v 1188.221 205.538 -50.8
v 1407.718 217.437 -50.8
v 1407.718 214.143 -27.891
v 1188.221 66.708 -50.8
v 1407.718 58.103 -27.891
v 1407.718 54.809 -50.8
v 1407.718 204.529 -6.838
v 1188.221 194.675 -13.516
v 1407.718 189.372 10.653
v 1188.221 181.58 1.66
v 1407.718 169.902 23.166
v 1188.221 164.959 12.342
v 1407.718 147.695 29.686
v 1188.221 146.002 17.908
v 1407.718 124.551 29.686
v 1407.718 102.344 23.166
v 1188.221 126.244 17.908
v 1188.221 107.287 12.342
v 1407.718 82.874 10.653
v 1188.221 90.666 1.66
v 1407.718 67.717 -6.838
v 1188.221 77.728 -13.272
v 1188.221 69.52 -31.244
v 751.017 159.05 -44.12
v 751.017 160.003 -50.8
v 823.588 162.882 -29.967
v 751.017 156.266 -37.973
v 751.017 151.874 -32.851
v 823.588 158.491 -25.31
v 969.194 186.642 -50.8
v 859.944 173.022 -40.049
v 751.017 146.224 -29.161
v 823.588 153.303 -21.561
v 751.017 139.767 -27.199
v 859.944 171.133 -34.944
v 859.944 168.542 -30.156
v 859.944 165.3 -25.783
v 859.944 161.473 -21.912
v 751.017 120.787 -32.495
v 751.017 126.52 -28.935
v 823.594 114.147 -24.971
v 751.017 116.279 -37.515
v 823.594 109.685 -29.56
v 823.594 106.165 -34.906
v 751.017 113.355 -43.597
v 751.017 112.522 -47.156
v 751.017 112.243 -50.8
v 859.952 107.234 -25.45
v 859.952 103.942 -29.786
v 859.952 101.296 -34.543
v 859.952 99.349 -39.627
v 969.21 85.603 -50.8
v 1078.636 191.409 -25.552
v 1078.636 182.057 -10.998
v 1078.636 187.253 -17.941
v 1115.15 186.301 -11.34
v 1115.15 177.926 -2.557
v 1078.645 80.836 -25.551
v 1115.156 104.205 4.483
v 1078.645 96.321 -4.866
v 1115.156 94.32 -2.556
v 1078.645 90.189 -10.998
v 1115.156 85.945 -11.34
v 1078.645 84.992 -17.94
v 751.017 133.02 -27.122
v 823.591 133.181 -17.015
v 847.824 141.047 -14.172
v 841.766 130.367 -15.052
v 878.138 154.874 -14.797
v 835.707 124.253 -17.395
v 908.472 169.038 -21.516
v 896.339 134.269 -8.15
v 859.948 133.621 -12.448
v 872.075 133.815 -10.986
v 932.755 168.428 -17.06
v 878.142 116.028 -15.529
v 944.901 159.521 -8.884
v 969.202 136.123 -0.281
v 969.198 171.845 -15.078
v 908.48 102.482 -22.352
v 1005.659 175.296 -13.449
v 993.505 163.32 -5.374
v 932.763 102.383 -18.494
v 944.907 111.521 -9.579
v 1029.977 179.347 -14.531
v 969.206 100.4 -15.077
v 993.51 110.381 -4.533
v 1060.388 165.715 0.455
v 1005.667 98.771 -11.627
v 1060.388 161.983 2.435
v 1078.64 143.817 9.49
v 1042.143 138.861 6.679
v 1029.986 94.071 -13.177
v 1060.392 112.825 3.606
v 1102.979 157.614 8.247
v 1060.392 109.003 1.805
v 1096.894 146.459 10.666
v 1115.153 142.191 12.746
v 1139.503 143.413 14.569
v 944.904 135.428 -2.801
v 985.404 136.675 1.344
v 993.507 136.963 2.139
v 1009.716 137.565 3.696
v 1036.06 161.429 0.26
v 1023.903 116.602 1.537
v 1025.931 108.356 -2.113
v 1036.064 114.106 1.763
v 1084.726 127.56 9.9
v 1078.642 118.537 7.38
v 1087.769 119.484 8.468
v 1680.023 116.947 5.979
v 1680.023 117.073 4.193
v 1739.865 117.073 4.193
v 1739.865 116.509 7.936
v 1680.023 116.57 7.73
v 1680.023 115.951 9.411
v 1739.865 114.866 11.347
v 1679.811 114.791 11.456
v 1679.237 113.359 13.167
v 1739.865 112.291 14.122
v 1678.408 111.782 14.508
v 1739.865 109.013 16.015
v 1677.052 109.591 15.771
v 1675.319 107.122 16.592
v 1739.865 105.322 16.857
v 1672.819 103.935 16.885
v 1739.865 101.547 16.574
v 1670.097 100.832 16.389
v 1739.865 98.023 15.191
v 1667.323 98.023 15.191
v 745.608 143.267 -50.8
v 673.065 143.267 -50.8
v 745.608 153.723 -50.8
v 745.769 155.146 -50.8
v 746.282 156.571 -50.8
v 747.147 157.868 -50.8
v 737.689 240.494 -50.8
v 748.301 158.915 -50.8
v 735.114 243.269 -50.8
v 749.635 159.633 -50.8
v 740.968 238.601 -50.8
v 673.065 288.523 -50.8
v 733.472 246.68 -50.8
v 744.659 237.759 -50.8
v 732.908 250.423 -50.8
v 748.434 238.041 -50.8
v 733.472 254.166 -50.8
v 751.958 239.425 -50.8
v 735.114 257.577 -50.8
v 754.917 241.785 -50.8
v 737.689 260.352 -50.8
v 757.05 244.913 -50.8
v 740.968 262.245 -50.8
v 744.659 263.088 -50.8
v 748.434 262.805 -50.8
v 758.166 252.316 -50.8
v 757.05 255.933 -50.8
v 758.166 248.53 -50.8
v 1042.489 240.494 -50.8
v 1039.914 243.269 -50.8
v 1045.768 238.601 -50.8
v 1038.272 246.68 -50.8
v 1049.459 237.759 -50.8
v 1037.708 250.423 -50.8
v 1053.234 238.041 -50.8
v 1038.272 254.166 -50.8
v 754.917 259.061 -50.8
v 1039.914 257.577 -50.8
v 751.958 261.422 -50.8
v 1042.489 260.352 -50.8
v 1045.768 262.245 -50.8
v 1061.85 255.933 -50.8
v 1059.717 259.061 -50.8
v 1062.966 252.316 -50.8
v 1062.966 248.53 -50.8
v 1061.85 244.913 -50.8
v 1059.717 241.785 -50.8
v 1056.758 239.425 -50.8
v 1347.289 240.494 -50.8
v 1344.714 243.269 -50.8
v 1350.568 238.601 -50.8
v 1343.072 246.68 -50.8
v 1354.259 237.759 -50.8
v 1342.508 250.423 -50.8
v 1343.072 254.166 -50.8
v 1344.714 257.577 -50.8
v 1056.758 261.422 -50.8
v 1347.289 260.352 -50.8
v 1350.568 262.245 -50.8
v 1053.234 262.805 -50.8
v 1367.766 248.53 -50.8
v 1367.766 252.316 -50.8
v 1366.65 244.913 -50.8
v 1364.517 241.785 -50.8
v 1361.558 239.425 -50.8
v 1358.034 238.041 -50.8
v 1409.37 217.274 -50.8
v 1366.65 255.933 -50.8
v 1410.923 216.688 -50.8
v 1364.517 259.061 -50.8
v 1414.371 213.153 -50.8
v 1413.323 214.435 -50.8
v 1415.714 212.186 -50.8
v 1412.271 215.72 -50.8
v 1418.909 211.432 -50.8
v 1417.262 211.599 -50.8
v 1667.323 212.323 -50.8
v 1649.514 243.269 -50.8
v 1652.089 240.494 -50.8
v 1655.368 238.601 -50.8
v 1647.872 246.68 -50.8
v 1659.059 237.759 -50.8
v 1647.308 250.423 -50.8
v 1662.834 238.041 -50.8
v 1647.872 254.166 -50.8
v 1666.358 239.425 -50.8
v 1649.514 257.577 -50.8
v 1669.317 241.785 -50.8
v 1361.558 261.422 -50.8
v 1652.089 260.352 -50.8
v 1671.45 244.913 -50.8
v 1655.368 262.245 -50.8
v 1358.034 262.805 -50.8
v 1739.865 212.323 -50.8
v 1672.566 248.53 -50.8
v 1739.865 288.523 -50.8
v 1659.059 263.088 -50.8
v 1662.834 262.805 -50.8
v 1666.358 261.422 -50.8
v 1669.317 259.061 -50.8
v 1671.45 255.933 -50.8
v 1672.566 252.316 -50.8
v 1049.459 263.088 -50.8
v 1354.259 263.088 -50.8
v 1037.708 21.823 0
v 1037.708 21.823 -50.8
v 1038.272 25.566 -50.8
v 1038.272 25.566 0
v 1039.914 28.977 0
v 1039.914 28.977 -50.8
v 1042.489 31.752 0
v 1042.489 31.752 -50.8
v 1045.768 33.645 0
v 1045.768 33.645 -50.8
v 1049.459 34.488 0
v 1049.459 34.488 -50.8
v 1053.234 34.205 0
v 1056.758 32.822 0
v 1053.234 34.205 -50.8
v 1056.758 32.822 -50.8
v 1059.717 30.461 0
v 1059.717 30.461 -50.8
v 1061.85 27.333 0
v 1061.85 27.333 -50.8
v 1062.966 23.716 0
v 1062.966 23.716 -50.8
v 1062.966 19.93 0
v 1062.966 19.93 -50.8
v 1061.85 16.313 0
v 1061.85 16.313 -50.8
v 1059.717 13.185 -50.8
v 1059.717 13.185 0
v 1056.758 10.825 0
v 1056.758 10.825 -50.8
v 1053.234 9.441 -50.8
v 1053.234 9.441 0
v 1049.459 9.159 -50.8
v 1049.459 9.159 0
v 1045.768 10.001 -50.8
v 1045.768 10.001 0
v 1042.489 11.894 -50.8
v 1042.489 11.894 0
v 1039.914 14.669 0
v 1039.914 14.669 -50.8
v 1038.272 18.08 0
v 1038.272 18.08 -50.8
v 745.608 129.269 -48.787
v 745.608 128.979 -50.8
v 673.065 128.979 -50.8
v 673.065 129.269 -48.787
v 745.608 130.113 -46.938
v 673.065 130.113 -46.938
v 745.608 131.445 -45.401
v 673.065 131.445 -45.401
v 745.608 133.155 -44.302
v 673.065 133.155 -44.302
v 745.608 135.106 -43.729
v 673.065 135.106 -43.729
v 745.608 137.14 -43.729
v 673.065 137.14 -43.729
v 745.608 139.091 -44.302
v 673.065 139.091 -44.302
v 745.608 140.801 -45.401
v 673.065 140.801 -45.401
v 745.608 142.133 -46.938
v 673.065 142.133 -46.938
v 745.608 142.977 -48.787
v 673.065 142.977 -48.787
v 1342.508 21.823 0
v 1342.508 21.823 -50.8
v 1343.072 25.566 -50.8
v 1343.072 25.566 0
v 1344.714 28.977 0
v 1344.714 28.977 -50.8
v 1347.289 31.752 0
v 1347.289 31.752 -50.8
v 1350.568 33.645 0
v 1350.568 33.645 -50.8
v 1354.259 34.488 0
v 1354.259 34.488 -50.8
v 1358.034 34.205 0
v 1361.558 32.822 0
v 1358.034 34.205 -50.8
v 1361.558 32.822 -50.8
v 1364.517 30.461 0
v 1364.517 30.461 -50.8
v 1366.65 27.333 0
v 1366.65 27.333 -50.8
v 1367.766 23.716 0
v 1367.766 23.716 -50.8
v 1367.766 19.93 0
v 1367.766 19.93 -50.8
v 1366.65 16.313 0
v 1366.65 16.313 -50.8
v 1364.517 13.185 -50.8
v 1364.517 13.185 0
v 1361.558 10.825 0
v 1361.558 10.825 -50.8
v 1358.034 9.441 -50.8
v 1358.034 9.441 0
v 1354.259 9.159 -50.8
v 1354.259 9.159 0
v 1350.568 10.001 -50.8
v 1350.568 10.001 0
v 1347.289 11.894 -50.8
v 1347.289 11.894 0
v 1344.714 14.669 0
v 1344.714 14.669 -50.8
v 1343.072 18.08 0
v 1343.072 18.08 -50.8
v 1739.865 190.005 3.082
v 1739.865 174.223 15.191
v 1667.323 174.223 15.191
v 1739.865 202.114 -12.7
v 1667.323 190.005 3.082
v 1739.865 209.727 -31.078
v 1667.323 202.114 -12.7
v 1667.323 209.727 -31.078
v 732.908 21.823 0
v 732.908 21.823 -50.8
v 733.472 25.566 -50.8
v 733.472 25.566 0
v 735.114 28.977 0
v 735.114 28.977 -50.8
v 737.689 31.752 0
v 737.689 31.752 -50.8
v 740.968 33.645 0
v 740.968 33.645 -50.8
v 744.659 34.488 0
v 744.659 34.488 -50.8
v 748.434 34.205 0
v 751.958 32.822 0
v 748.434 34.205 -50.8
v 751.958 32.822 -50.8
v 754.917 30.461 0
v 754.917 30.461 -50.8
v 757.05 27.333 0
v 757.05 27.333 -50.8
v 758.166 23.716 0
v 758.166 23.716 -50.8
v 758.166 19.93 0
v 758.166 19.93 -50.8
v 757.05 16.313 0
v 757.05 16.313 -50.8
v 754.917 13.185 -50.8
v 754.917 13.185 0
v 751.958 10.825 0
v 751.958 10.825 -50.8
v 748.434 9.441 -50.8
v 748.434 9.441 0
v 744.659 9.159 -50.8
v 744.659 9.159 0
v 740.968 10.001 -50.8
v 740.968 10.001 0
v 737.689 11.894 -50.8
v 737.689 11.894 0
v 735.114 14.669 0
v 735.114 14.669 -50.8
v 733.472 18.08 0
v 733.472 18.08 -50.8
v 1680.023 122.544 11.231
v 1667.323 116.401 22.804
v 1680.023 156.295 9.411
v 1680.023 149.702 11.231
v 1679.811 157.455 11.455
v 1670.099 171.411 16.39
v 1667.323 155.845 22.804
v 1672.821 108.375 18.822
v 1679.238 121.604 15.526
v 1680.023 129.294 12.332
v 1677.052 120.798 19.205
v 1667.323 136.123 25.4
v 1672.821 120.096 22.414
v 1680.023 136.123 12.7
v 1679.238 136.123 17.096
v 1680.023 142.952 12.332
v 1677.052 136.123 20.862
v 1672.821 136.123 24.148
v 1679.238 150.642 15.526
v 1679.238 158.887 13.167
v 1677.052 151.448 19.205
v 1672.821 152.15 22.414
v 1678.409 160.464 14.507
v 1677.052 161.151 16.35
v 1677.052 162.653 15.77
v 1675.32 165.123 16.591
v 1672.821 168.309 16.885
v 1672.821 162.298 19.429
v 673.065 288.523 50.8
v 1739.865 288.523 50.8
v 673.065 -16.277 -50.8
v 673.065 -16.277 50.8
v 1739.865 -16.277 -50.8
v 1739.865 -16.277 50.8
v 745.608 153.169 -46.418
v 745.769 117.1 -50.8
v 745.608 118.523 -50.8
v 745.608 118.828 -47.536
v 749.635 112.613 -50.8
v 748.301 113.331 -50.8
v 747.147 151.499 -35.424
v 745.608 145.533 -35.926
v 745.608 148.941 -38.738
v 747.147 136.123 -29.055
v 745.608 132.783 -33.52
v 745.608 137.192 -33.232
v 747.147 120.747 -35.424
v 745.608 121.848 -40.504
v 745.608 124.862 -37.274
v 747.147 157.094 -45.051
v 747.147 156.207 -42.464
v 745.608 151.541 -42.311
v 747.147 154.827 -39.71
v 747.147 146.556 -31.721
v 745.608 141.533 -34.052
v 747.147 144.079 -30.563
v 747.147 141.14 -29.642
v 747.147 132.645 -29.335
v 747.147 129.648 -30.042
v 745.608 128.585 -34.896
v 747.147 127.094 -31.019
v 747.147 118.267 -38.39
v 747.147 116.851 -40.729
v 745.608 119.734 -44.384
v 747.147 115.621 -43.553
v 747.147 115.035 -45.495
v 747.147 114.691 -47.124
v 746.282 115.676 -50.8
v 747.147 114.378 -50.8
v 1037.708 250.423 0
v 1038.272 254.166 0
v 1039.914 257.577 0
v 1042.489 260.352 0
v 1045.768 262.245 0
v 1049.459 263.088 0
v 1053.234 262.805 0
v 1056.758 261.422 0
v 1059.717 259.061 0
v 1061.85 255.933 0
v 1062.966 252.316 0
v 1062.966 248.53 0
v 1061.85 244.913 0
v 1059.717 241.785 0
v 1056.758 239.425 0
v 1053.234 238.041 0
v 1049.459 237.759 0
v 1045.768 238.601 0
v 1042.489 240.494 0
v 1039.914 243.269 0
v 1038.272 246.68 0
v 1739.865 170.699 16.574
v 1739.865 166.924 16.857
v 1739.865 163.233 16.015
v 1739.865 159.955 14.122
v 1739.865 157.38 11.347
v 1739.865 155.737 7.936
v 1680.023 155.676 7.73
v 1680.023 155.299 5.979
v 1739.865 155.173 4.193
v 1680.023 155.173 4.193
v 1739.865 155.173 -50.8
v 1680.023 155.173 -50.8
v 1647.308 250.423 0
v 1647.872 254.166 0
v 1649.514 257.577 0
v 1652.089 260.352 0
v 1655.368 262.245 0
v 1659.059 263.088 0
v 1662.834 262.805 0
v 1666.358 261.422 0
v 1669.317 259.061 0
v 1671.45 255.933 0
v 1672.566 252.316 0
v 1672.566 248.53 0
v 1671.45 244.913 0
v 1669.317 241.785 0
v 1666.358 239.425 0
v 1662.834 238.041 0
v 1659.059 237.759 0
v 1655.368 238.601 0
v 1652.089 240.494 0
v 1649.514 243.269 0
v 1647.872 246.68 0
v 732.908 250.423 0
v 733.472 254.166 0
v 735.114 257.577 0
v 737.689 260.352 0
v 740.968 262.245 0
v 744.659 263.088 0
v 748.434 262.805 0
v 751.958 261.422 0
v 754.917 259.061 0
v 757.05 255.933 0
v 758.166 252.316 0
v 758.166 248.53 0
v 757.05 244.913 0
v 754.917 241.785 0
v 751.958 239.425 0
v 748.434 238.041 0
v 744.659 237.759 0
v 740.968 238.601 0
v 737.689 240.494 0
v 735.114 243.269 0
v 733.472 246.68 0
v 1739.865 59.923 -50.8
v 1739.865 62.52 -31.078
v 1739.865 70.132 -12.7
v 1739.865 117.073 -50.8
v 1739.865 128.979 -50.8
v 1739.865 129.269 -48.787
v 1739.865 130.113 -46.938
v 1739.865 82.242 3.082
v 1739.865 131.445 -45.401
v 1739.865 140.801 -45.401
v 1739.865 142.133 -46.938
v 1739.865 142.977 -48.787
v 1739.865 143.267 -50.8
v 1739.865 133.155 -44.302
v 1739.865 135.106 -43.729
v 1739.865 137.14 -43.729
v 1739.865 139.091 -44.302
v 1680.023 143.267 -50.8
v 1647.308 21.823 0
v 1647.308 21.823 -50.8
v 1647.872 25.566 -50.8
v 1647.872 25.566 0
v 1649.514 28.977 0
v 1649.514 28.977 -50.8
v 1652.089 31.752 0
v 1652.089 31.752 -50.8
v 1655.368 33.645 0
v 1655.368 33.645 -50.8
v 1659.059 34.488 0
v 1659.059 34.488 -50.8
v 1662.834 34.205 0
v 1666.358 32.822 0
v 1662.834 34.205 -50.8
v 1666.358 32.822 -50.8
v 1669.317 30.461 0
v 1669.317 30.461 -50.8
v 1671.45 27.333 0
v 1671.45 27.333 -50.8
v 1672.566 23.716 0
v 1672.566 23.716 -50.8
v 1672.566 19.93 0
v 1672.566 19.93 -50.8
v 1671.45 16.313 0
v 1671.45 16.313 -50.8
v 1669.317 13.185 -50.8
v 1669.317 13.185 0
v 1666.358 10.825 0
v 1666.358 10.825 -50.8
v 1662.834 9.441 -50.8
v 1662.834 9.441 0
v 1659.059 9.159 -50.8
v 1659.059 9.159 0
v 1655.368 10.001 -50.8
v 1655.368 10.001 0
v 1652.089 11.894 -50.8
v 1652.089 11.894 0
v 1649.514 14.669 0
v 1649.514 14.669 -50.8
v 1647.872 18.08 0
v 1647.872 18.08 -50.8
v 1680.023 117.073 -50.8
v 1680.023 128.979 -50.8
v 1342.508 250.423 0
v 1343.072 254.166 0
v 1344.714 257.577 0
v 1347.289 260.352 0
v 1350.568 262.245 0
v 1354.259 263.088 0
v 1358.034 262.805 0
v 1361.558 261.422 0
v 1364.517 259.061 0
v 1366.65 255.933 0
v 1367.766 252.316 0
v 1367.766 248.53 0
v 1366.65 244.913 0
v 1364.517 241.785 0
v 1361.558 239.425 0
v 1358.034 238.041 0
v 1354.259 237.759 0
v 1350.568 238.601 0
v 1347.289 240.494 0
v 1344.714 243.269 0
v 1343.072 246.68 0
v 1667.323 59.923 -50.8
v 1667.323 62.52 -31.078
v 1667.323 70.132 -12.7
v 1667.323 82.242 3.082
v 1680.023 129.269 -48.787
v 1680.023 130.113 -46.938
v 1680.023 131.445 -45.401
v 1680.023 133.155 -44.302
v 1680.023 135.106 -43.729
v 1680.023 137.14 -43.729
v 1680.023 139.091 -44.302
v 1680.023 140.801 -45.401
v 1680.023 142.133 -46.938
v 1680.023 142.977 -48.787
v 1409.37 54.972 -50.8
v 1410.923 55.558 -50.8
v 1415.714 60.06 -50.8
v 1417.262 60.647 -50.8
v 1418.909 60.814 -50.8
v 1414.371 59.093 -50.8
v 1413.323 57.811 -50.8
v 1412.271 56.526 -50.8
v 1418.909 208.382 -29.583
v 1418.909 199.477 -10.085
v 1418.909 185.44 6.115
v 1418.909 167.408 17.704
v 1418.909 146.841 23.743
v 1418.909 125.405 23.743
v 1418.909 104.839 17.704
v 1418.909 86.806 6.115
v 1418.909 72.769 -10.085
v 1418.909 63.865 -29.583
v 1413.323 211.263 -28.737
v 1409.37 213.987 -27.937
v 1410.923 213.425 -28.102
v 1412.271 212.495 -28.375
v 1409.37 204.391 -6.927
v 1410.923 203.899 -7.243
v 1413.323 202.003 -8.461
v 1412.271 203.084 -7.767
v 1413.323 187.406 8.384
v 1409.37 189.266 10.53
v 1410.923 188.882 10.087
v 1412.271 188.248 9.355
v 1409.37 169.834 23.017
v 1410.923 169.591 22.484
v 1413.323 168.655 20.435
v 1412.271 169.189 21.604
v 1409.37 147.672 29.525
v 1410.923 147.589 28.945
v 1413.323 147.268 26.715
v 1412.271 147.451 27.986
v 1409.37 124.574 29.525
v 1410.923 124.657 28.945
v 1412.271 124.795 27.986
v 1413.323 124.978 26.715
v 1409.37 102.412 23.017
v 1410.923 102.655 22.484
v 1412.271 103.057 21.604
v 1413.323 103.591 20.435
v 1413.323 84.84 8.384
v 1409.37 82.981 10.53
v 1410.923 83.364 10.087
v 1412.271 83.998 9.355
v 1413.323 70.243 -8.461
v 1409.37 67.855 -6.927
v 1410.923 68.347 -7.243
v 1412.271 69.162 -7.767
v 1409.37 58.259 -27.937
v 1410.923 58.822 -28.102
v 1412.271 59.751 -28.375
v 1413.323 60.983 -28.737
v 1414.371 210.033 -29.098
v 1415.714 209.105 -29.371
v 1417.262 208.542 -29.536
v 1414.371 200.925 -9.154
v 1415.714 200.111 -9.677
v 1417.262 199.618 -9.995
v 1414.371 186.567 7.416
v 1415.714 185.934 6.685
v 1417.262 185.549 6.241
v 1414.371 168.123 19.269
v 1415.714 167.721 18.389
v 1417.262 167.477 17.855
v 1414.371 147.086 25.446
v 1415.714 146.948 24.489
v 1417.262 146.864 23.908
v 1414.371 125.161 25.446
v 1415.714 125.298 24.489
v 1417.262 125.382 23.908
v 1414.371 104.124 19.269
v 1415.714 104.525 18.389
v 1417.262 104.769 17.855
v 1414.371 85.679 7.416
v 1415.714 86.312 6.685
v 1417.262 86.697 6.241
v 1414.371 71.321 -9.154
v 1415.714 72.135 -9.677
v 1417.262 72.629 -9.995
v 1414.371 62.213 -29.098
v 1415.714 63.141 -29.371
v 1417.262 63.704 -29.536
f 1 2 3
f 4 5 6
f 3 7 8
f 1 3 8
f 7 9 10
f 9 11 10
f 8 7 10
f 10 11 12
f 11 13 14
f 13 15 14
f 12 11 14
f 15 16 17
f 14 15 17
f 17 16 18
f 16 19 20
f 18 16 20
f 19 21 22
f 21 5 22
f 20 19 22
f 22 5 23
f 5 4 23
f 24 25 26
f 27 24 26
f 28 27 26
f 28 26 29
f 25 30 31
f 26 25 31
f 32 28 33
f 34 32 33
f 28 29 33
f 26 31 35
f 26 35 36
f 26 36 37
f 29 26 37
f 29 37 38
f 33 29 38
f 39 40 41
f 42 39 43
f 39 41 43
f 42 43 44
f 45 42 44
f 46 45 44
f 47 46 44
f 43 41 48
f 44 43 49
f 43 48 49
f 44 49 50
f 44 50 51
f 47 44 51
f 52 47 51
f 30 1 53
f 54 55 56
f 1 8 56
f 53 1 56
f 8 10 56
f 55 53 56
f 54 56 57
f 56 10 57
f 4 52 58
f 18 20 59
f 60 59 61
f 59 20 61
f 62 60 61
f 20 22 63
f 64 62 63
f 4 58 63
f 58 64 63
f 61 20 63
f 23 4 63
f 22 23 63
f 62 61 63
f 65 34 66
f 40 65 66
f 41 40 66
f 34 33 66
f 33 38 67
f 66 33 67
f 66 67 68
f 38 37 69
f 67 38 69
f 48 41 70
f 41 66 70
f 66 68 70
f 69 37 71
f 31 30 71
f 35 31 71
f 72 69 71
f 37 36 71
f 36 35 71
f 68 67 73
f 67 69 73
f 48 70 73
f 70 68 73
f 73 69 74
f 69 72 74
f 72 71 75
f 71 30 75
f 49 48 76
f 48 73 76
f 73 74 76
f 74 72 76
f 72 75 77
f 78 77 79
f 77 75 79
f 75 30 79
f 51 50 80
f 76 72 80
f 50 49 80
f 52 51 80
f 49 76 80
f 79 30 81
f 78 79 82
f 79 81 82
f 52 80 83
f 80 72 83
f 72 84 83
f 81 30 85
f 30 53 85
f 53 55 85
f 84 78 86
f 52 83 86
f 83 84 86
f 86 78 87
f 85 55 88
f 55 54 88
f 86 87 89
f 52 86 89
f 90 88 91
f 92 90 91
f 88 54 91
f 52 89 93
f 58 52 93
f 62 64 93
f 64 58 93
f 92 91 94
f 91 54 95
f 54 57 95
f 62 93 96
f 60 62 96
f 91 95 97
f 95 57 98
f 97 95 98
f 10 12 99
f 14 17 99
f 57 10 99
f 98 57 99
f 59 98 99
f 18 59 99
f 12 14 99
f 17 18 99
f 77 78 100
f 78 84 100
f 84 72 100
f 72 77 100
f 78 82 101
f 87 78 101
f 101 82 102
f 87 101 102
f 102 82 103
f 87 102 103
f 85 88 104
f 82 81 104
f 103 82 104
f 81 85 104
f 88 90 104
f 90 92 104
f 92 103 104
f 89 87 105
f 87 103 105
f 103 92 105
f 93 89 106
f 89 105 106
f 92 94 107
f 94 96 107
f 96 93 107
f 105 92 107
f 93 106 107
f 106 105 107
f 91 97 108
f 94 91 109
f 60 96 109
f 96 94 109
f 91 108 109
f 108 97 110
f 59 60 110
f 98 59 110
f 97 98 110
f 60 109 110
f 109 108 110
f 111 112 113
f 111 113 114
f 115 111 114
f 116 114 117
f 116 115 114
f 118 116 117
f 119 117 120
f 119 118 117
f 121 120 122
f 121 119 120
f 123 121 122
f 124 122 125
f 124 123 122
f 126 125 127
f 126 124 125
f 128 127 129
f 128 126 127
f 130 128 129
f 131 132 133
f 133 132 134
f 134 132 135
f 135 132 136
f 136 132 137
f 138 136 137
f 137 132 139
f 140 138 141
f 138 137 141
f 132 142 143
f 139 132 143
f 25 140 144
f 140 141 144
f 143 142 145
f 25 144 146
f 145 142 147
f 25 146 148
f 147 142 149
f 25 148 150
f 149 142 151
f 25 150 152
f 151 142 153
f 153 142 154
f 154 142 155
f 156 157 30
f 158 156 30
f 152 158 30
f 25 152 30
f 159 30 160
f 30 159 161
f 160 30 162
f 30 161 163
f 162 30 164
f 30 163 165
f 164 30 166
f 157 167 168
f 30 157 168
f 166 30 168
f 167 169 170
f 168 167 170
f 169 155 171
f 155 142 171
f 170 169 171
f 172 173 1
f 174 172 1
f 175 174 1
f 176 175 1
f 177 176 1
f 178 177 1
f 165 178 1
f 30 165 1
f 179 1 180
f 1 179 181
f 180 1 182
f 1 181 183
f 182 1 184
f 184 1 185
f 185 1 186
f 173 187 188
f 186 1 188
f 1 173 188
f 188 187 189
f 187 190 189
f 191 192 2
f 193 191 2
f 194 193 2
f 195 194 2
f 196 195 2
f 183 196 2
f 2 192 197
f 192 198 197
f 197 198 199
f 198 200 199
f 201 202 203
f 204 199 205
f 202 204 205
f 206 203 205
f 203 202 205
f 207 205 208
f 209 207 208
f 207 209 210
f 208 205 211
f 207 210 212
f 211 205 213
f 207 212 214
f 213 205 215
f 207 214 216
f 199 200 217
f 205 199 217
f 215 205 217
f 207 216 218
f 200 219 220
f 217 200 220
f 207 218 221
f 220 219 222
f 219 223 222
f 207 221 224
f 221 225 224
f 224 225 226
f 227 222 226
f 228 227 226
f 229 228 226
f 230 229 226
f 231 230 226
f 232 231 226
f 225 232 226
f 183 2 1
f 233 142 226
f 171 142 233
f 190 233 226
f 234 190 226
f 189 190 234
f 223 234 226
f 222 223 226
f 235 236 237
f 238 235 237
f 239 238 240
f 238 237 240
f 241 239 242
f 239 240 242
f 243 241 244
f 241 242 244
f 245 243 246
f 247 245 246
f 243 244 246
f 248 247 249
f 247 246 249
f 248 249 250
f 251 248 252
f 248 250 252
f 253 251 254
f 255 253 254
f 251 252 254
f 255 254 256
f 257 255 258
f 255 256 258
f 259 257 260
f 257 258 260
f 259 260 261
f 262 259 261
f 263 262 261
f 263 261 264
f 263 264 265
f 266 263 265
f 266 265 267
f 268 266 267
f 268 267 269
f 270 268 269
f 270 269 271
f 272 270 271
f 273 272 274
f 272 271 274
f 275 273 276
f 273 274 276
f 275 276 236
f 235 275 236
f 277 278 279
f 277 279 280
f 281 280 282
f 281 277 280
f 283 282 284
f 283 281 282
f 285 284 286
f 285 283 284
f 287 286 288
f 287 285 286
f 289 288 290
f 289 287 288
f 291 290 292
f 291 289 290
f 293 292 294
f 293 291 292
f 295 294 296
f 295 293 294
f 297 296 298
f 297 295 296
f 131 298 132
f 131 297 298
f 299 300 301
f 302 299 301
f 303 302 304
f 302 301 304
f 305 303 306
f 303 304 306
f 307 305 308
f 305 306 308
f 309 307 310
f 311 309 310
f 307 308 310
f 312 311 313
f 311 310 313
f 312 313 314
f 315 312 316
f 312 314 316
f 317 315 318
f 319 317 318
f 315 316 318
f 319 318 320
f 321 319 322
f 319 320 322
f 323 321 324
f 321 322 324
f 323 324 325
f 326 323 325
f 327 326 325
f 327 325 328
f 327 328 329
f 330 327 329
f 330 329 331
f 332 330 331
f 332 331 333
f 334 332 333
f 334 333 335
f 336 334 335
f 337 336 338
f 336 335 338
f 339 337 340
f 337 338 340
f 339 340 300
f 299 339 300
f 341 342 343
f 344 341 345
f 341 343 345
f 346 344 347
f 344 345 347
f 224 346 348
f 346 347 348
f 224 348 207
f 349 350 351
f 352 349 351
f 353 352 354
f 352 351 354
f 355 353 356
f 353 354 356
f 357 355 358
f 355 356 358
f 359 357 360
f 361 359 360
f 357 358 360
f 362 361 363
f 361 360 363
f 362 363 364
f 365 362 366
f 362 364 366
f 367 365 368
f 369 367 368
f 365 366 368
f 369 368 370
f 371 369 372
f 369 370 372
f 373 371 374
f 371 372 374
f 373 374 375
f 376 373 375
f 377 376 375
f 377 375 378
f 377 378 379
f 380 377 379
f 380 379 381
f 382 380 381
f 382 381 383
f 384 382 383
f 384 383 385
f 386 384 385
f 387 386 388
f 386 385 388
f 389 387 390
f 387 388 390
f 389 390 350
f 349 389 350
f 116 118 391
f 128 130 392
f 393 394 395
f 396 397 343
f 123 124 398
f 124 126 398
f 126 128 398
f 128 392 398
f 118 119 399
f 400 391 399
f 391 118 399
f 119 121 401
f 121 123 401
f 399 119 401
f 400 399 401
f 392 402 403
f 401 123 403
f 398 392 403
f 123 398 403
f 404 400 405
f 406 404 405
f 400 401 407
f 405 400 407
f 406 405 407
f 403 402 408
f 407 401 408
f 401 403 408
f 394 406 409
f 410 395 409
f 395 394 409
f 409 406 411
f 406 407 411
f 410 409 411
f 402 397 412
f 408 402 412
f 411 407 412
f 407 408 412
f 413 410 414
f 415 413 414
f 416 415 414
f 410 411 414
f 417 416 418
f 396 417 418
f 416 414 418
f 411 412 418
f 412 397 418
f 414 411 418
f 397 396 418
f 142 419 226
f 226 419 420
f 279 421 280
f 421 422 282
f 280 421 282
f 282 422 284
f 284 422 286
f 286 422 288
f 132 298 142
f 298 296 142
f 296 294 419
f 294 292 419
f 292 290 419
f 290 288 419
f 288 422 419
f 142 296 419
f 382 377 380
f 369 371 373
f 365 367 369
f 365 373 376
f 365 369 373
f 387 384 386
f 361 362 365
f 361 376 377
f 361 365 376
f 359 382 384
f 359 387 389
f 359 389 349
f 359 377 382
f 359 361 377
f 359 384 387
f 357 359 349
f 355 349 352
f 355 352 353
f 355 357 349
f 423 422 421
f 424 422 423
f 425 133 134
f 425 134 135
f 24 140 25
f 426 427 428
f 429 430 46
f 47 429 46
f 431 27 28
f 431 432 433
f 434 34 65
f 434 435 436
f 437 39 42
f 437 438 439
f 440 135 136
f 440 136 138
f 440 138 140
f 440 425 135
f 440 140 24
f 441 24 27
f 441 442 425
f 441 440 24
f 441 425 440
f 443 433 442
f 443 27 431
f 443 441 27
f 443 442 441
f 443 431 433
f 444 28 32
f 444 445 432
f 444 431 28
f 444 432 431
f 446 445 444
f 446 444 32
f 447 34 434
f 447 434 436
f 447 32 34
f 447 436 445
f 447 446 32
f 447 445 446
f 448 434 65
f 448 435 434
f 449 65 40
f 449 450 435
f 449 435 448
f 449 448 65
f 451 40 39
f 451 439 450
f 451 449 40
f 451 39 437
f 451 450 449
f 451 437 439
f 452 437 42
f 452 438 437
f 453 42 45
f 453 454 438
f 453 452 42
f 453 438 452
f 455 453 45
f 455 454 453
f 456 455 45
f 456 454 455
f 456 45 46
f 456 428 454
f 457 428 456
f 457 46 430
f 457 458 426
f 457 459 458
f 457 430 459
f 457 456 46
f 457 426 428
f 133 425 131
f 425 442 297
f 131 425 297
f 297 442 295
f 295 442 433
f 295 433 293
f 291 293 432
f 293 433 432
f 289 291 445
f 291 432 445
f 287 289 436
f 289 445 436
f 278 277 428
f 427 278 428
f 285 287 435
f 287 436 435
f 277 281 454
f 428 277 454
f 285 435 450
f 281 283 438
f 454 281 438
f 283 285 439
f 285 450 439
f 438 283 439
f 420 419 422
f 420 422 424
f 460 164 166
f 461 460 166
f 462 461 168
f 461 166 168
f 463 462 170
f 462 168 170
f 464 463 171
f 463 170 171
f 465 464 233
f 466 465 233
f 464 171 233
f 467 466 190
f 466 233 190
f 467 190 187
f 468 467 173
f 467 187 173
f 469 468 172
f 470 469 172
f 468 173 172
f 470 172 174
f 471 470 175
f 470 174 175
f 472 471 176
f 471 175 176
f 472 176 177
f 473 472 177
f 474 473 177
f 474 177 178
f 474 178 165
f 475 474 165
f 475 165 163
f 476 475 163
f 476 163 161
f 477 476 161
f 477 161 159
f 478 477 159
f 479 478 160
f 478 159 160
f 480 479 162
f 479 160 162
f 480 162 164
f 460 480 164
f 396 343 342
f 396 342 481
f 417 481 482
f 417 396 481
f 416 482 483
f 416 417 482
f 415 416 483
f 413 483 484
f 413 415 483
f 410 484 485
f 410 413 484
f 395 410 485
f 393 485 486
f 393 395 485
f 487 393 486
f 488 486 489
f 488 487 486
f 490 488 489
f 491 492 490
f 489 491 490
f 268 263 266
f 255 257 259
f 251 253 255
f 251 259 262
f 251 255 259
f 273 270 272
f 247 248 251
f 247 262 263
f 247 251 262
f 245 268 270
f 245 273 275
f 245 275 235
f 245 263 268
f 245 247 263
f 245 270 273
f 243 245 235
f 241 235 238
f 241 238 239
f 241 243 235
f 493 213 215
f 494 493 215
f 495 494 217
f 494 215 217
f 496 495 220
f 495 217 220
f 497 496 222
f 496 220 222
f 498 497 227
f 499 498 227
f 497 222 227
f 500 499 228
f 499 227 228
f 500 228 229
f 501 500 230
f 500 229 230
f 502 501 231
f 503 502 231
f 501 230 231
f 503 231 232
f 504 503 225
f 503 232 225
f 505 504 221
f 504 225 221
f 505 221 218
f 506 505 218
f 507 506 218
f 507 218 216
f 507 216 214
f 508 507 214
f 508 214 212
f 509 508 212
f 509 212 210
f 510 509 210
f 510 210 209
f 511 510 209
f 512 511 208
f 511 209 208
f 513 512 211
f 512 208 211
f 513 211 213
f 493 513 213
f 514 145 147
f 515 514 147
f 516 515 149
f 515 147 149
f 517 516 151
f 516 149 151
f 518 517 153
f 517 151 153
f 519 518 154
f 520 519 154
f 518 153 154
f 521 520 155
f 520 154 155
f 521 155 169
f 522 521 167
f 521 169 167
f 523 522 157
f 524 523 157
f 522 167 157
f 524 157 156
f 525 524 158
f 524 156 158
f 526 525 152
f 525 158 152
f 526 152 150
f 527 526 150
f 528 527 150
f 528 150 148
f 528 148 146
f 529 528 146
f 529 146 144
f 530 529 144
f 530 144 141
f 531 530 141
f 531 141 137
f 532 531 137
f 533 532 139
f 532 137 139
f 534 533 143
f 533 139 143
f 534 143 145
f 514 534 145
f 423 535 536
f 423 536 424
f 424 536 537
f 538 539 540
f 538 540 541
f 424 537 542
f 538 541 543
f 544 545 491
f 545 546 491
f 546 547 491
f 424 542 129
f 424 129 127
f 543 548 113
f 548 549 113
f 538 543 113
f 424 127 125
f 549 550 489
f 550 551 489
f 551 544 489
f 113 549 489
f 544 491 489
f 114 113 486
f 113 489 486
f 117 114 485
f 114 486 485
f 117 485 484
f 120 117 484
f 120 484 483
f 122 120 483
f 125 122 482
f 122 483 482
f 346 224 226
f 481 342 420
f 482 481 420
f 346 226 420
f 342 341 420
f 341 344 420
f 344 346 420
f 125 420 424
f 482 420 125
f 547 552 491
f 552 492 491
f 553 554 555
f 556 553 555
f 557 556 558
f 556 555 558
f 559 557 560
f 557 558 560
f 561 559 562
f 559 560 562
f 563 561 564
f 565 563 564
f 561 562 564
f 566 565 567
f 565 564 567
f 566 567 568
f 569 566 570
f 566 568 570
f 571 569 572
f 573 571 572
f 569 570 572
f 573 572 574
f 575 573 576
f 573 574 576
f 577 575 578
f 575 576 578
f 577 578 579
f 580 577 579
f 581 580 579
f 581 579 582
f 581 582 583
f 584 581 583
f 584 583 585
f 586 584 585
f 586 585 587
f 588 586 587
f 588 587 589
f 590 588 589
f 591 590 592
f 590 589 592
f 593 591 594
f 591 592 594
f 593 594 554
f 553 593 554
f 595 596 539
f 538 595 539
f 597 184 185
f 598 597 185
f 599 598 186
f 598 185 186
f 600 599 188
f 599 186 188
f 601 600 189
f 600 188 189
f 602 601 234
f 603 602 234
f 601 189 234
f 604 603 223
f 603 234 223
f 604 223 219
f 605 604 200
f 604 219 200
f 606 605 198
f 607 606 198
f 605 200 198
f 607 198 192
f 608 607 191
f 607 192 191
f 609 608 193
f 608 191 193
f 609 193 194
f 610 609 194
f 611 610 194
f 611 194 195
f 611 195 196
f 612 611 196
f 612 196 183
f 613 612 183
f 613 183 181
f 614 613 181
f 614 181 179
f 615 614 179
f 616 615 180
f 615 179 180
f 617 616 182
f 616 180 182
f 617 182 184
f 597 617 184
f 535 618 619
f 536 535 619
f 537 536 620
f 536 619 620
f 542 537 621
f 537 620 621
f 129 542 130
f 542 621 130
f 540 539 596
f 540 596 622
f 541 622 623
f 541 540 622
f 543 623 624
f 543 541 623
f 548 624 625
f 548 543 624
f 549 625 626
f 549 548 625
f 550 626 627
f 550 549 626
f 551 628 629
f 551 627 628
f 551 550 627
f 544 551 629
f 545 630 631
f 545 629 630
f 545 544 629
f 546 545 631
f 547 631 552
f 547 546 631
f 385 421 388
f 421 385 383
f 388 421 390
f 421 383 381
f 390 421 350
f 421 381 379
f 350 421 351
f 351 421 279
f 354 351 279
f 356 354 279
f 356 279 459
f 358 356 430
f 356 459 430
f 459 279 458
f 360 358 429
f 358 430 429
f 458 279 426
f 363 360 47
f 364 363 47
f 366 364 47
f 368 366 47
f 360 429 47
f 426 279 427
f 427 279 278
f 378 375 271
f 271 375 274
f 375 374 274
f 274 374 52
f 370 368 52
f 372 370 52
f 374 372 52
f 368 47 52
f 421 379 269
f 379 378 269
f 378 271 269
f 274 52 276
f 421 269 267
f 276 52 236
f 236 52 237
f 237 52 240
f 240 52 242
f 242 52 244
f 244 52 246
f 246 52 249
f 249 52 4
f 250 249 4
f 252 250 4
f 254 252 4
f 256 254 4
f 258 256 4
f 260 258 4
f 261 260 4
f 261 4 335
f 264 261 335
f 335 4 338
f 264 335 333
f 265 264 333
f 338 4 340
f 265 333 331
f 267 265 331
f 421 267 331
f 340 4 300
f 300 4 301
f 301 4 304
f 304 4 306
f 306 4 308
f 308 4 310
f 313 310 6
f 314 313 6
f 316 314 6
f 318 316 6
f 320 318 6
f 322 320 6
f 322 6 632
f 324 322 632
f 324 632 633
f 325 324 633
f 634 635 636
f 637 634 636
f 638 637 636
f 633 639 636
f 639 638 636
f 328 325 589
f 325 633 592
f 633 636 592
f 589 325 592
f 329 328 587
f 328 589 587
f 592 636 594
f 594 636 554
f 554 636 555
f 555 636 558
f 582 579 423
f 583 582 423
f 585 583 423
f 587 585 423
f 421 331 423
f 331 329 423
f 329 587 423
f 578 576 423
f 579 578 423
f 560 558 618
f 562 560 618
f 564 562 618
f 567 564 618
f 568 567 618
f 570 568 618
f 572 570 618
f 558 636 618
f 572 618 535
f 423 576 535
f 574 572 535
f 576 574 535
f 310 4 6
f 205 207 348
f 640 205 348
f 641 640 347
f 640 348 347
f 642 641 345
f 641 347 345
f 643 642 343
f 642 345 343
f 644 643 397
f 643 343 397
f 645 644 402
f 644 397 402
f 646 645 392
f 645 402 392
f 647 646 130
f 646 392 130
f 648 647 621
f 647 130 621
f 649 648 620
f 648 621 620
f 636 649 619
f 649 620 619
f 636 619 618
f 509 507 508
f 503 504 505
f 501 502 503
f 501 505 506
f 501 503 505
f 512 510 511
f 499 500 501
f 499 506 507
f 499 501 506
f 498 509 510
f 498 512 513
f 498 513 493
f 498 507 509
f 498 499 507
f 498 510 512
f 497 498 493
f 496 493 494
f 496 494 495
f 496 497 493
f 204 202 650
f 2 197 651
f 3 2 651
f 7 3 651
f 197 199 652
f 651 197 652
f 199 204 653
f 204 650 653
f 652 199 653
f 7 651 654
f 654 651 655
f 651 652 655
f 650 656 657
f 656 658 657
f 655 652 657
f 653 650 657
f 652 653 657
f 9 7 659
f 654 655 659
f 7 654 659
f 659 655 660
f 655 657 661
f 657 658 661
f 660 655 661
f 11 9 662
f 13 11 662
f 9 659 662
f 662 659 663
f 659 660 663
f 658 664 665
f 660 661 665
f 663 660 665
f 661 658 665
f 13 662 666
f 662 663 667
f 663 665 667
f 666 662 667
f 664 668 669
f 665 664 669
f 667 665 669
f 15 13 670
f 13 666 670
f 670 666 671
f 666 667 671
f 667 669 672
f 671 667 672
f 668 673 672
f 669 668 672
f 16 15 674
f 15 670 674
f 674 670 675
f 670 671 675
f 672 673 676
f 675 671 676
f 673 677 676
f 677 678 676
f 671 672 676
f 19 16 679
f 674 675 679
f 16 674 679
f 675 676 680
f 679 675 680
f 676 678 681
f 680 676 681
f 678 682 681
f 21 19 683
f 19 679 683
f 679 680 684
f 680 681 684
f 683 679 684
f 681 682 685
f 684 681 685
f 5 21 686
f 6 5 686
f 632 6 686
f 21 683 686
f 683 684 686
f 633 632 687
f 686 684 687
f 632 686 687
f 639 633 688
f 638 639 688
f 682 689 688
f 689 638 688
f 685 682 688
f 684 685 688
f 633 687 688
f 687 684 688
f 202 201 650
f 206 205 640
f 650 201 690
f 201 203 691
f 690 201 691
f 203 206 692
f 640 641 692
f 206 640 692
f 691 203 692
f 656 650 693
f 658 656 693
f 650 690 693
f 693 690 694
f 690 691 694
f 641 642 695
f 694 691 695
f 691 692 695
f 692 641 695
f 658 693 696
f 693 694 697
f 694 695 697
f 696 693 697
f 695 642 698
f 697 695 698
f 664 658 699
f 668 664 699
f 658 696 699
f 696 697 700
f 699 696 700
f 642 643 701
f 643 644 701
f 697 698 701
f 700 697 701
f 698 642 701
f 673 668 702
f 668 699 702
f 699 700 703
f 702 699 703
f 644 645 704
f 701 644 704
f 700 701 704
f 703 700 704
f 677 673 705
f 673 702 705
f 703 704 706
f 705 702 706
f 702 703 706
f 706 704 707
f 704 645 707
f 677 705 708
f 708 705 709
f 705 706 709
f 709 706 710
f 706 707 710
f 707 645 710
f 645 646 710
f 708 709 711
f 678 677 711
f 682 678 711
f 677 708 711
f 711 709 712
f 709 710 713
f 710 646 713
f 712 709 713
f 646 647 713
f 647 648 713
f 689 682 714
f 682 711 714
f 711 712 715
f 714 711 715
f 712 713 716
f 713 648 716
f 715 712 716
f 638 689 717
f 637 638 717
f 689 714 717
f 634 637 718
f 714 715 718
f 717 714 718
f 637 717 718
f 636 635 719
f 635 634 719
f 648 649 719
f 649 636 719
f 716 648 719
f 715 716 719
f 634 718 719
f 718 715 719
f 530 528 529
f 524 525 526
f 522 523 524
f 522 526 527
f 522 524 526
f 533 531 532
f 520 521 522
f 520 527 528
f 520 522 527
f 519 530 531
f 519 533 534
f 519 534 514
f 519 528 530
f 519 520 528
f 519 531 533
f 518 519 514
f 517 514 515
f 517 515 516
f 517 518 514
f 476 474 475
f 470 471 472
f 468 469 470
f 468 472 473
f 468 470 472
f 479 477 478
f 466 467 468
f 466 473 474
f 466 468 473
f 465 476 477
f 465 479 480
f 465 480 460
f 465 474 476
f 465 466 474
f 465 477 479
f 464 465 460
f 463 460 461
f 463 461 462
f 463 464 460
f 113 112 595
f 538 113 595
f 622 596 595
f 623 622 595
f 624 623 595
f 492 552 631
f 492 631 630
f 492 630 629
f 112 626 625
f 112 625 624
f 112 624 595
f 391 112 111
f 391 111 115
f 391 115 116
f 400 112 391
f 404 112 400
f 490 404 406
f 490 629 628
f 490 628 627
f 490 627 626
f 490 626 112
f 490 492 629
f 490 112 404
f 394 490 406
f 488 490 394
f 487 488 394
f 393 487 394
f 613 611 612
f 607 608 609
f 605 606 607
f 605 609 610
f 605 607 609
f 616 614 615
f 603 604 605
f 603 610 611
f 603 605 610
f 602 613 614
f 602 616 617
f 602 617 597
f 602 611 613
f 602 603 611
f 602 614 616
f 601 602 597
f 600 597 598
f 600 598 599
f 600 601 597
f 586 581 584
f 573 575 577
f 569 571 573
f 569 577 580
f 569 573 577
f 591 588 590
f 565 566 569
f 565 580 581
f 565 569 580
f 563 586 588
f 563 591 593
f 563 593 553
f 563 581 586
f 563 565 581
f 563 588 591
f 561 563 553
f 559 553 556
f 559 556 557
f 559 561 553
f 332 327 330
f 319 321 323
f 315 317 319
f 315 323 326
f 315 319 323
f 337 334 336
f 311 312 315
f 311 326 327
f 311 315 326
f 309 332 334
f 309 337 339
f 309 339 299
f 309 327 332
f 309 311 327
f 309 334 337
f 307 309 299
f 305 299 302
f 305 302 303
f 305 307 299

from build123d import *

# Parameters (mm, degrees)
SKETCH2_W                    = 1066.8
SKETCH2_H                    = 304.8
BOSS_EXTRUDE1_DEPTH          = 50.8
CUT_EXTRUDE1_DEPTH           = 1107.294920223
CUT_EXTRUDE1_DEPTH_BACK      = 1107.294920223
SKETCH4_R                    = 7.14375
CUT_EXTRUDE3_DEPTH           = 1037.520325732
FILLET4_R                    = 6.35
REGISTRATION_HOLE_SKETCH_R   = 12.7
BASE_REGISTRATION_HOLE_DEPTH = 50.8
LPATTERN3_COUNT              = 4
LPATTERN3_PITCH              = 304.8
LPATTERN3_COUNT_DIR2         = 2
LPATTERN3_PITCH_DIR2         = 228.6
SKETCH7_R                    = 76.2
CUT_EXTRUDE4_DEPTH           = 12.7
FILLET5_R                    = 12.7


# Read off the part's stored shape, not the designer's step: Indent1
with BuildPart() as part:
    # Sketch2 → Boss-Extrude1 (new, symmetric)
    with BuildSketch(Plane.XY):
        with Locations((1206.465176028, 136.123084384)):
            Rectangle(SKETCH2_W, SKETCH2_H)
    extrude(amount=BOSS_EXTRUDE1_DEPTH, both=True)

    # Indent1 outline → Indent1 (revolve, cut)
    with BuildSketch(Plane(origin=(0, 136.123084384, -50.8), x_dir=(0, 1, 0), z_dir=(0, 0, -1))):
        with BuildLine():
            Line((76.2, 1667.322776028), (0, 1667.322776028))
            Line((0, 1667.322776028), (0, 745.607576028))
            Line((0, 745.607576028), (23.064945381, 745.607576028))
            add(Edge.make_bspline(
                [(23.064945381, 745.607576028), (23.566825523, 748.91437787), (25.363204219, 760.90488429), (28.330664868, 781.598898763), (31.871058885, 807.703400336), (35.241099853, 833.832092117), (38.460845457, 859.980959498), (42.572514827, 894.869141414), (47.400937928, 938.517112788), (52.760650205, 990.942462001), (57.722301111, 1043.408031291), (62.308317352, 1095.908289185), (67.933123727, 1165.949858053), (72.828043506, 1236.047318759), (76.911244662, 1306.192759412), (79.080505646, 1350.052513699), (80.485669281, 1383.896744518), (81.068244998, 1400.195093482), (81.313954963, 1407.717593946)],
                knots=[0.116308657, 0.116308657, 0.116308657, 0.116308657, 0.125901739, 0.151082086, 0.176262434, 0.201442782, 0.22662313, 0.251803477, 0.302164173, 0.352524868, 0.402885564, 0.453246259, 0.503606955, 0.604328346, 0.654689041, 0.705049737, 0.730230084, 0.75181382, 0.75181382, 0.75181382, 0.75181382], degree=3))
            ThreePointArc((81.313954963, 1407.717593946), (80.564993874, 1410.923022844), (78.31179575, 1413.322776028))
            ThreePointArc((78.31179575, 1413.322776028), (76.063072477, 1415.714189378), (75.309046779, 1418.909038266))
            add(Edge.make_bspline(
                [(75.309046779, 1418.909038266), (75.323959024, 1419.411481069), (75.408519742, 1422.276130669), (75.558482998, 1427.503133809), (75.676289458, 1432.228116929), (75.735192688, 1434.590608489), (75.838475179, 1438.733064052), (76.045040161, 1447.017975177), (76.2, 1459.45016933), (76.2, 1467.737655163), (76.2, 1471.88139808), (76.2, 1476.663773407), (76.2, 1486.228524062), (76.2, 1500.575650045), (76.2, 1510.1404007), (76.2, 1514.922776028), (76.2, 1565.722776028), (76.2, 1616.522776028), (76.2, 1667.322776028)],
                knots=[0.761574077, 0.761574077, 0.761574077, 0.761574077, 0.763021384, 0.769825774, 0.776630163, 0.776630163, 0.776630163, 0.788561161, 0.800492159, 0.812423157, 0.812423157, 0.812423157, 0.826192956, 0.839962756, 0.853732555, 0.853732555, 0.853732555, 1, 1, 1, 1], degree=3))
        make_face()
    revolve(axis=Axis((0, 136.123084384, -50.8), (1, 0, 0)), mode=Mode.SUBTRACT)

    # Sketch4 → Cut-Extrude1 (cut, two sides: drawn at the far end of the back side and taken through both)
    with BuildSketch(Plane.ZY.offset(-1739.865176028).offset(-CUT_EXTRUDE1_DEPTH_BACK)):
        with Locations((-50.8, 136.123084384)):
            Circle(SKETCH4_R)
    extrude(amount=CUT_EXTRUDE1_DEPTH + CUT_EXTRUDE1_DEPTH_BACK, mode=Mode.SUBTRACT)

    # Sketch6 → Cut-Extrude3 (cut, through all)
    with BuildSketch(Plane.ZY.offset(-1667.322776028)):
        with BuildLine():
            Line((22.980332745, 117.073084384), (-50.8, 117.073084384))
            Line((-50.8, 117.073084384), (-50.8, 59.923084384))
            ThreePointArc((-50.8, 59.923084384), (-4.1372204, 75.881694958), (22.980332745, 117.073084384))
        make_face()
        with BuildLine():
            Line((-50.8, 155.173084384), (22.980332745, 155.173084384))
            ThreePointArc((22.980332745, 155.173084384), (-4.1372204, 196.364473811), (-50.8, 212.323084384))
            Line((-50.8, 212.323084384), (-50.8, 199.623084384))
            Line((-50.8, 199.623084384), (-50.8, 155.173084384))
        make_face()
    extrude(amount=-CUT_EXTRUDE3_DEPTH, mode=Mode.SUBTRACT)

    # Fillet4
    fillet4_edges = [part.edges().sort_by_distance(p)[0] for p in [
        (745.607576028, 136.123084384, -27.735054619),
    ]]
    fillet(fillet4_edges, radius=FILLET4_R)

    # Registration Hole Sketch → Base-Registration-Hole (cut)
    with BuildSketch(Plane(origin=(0, 0, -50.8), x_dir=(-1, 0, 0), z_dir=(0, 0, -1))):
        with Locations((-745.607576028, 21.823084384)):
            Circle(REGISTRATION_HOLE_SKETCH_R)
    base_registration_hole = extrude(amount=-BASE_REGISTRATION_HOLE_DEPTH, mode=Mode.SUBTRACT)

    # LPattern3: Base-Registration-Hole 4 × 2
    with Locations(*[(i * LPATTERN3_PITCH, j * LPATTERN3_PITCH_DIR2, 0) for i in range(LPATTERN3_COUNT) for j in range(LPATTERN3_COUNT_DIR2) if (i, j) != (0, 0)]):
        add(base_registration_hole, mode=Mode.SUBTRACT)

    # Sketch7 → Cut-Extrude4 (cut)
    with BuildSketch(Plane.ZY.offset(-1667.322776028)):
        with Locations((-50.8, 136.123084384)):
            Circle(SKETCH7_R)
    extrude(amount=-CUT_EXTRUDE4_DEPTH, mode=Mode.SUBTRACT)

    # Fillet5
    # the kernel refuses this fillet: 12.7 mm, written as the material it adds along each edge
    with BuildSketch(Plane(origin=(1680.022776028, 136.123084384, -50.8), x_dir=(0, -0.6204773534699832, 0.7842243644716003), z_dir=(0, -0.7842243644716003, -0.6204773534699832))) as fillet5_piece_1_section:
        with BuildLine():
            CenterArc((76.2 - FILLET5_R, FILLET5_R), FILLET5_R, 270, 90)
            Line((76.2 - FILLET5_R, 0), (76.2, 0))
            Line((76.2, 0), (76.2, FILLET5_R))
        make_face()
    fillet5_piece_1 = revolve(axis=Axis((1680.022776028, 136.123084384, -50.8), (-1, 0, 0)), revolution_arc=38.351001738, mode=Mode.PRIVATE)
    fillet5_piece_1 = split(fillet5_piece_1, bisect_by=Plane(origin=(1677.149054572, 117.073084384, 21.679553224), z_dir=(0, 1, 0)), keep=Keep.TOP, mode=Mode.PRIVATE)
    add(fillet5_piece_1)
    with BuildSketch(Plane(origin=(1680.022776028, 117.073084384, 22.980332745), x_dir=(0, -0.9256147934109615, -0.37846697903355186), z_dir=(1, 0, 0))) as fillet5_piece_2:
        with BuildLine():
            CenterArc((18.865839358, 12.583660567), FILLET5_R, 157.761243907, 120)
            Line((7.110531482, 17.390191201), (0, 0))
            ThreePointArc((0, 0), (10.290457832, -0.698036598), (20.580915663, 0))
        make_face()
    extrude(amount=59.8424)
    with BuildSketch(Plane(origin=(1680.022776028, 155.173084384, 22.980332745), x_dir=(0, 0, -1), z_dir=(1, 0, 0))) as fillet5_piece_3:
        with BuildLine():
            CenterArc((18.787719605, 12.7), FILLET5_R, 150, 120)
            ThreePointArc((7.789196977, 19.05), (3.248485487, 9.789183802), (0, 0))
            Line((0, 0), (18.787719605, 0))
        make_face()
    extrude(amount=59.8424)
    with BuildSketch(Plane(origin=(1680.022776028, 136.123084384, -50.8), x_dir=(0, 0, 1), z_dir=(0, -1, 0))) as fillet5_piece_4_section:
        with BuildLine():
            CenterArc((76.2 - FILLET5_R, FILLET5_R), FILLET5_R, 270, 90)
            Line((76.2, FILLET5_R), (76.2, 0))
            Line((76.2, 0), (76.2 - FILLET5_R, 0))
        make_face()
    fillet5_piece_4 = revolve(axis=Axis((1680.022776028, 136.123084384, -50.8), (-1, 0, 0)), revolution_arc=38.351001738, mode=Mode.PRIVATE)
    fillet5_piece_4 = split(fillet5_piece_4, bisect_by=Plane(origin=(1677.14905497, 155.173084384, 21.679553319), z_dir=(0, -1, 0)), keep=Keep.TOP, mode=Mode.PRIVATE)
    add(fillet5_piece_4)
    with BuildSketch(Plane(origin=(1628.570486869, 117.073084384, 22.980332745), x_dir=(0, -0.9256147934109611, -0.378466979033553), z_dir=(1, 0, 0))) as fillet5_piece_5a_section:
        with BuildLine():
            CenterArc((18.865839358, 12.583660567), FILLET5_R, 157.761243907, 120)
            Line((7.110531482, 17.390191201), (0, 0))
            ThreePointArc((0, 0), (10.290457832, -0.698036598), (20.580915663, 0))
        make_face()
    fillet5_piece_5a = extrude(amount=111.294689159, mode=Mode.PRIVATE)
    fillet5_piece_5a = split(fillet5_piece_5a, bisect_by=Plane(origin=(1680.022776028, 112.40455017, 17.056705553), z_dir=(-1, 0, 0)), keep=Keep.TOP, mode=Mode.PRIVATE)
    with BuildSketch(Plane(origin=(1680.022776028, 136.123084384, -50.8), x_dir=(0, -0.6204773534699832, 0.7842243644716003), z_dir=(0, -0.7842243644716003, -0.6204773534699832))) as fillet5_piece_5b_section:
        with BuildLine():
            CenterArc((76.2 - FILLET5_R, FILLET5_R), FILLET5_R, 270, 90)
            Line((76.2 - FILLET5_R, 0), (76.2, 0))
            Line((76.2, 0), (76.2, FILLET5_R))
        make_face()
    fillet5_piece_5b = revolve(axis=Axis((1680.022776028, 136.123084384, -50.8), (-1, 0, 0)), revolution_arc=38.351001738, mode=Mode.PRIVATE)
    fillet5_piece_5b = split(fillet5_piece_5b, bisect_by=Plane(origin=(1677.047146673, 117.073084384, 14.411791174), z_dir=(0, -1, 0)), keep=Keep.TOP, mode=Mode.PRIVATE)
    fillet5_piece_5 = fillet5_piece_5a & fillet5_piece_5b
    add(fillet5_piece_5)
    with BuildSketch(Plane(origin=(1680.022776028, 136.123084384, -50.8), x_dir=(0, 0, 1), z_dir=(0, -1, 0))) as fillet5_piece_6a_section:
        with BuildLine():
            CenterArc((76.2 - FILLET5_R, FILLET5_R), FILLET5_R, 270, 90)
            Line((76.2, FILLET5_R), (76.2, 0))
            Line((76.2, 0), (76.2 - FILLET5_R, 0))
        make_face()
    fillet5_piece_6a = revolve(axis=Axis((1680.022776028, 136.123084384, -50.8), (-1, 0, 0)), revolution_arc=38.351001738, mode=Mode.PRIVATE)
    fillet5_piece_6a = split(fillet5_piece_6a, bisect_by=Plane(origin=(1677.047146631, 155.173084384, 14.41179131), z_dir=(0, 1, 0)), keep=Keep.TOP, mode=Mode.PRIVATE)
    with BuildSketch(Plane(origin=(1628.570486869, 155.173084384, 22.980332745), x_dir=(0, 0, -1), z_dir=(1, 0, 0))) as fillet5_piece_6b_section:
        with BuildLine():
            CenterArc((18.787719605, 12.7), FILLET5_R, 150, 120)
            ThreePointArc((7.789196977, 19.05), (3.248485487, 9.789183802), (0, 0))
            Line((0, 0), (18.787719605, 0))
        make_face()
    fillet5_piece_6b = extrude(amount=111.294689159, mode=Mode.PRIVATE)
    fillet5_piece_6b = split(fillet5_piece_6b, bisect_by=Plane(origin=(1680.022776028, 159.841618598, 17.056705553), z_dir=(-1, 0, 0)), keep=Keep.TOP, mode=Mode.PRIVATE)
    fillet5_piece_6 = fillet5_piece_6a & fillet5_piece_6b
    add(fillet5_piece_6)


solid = part.part
